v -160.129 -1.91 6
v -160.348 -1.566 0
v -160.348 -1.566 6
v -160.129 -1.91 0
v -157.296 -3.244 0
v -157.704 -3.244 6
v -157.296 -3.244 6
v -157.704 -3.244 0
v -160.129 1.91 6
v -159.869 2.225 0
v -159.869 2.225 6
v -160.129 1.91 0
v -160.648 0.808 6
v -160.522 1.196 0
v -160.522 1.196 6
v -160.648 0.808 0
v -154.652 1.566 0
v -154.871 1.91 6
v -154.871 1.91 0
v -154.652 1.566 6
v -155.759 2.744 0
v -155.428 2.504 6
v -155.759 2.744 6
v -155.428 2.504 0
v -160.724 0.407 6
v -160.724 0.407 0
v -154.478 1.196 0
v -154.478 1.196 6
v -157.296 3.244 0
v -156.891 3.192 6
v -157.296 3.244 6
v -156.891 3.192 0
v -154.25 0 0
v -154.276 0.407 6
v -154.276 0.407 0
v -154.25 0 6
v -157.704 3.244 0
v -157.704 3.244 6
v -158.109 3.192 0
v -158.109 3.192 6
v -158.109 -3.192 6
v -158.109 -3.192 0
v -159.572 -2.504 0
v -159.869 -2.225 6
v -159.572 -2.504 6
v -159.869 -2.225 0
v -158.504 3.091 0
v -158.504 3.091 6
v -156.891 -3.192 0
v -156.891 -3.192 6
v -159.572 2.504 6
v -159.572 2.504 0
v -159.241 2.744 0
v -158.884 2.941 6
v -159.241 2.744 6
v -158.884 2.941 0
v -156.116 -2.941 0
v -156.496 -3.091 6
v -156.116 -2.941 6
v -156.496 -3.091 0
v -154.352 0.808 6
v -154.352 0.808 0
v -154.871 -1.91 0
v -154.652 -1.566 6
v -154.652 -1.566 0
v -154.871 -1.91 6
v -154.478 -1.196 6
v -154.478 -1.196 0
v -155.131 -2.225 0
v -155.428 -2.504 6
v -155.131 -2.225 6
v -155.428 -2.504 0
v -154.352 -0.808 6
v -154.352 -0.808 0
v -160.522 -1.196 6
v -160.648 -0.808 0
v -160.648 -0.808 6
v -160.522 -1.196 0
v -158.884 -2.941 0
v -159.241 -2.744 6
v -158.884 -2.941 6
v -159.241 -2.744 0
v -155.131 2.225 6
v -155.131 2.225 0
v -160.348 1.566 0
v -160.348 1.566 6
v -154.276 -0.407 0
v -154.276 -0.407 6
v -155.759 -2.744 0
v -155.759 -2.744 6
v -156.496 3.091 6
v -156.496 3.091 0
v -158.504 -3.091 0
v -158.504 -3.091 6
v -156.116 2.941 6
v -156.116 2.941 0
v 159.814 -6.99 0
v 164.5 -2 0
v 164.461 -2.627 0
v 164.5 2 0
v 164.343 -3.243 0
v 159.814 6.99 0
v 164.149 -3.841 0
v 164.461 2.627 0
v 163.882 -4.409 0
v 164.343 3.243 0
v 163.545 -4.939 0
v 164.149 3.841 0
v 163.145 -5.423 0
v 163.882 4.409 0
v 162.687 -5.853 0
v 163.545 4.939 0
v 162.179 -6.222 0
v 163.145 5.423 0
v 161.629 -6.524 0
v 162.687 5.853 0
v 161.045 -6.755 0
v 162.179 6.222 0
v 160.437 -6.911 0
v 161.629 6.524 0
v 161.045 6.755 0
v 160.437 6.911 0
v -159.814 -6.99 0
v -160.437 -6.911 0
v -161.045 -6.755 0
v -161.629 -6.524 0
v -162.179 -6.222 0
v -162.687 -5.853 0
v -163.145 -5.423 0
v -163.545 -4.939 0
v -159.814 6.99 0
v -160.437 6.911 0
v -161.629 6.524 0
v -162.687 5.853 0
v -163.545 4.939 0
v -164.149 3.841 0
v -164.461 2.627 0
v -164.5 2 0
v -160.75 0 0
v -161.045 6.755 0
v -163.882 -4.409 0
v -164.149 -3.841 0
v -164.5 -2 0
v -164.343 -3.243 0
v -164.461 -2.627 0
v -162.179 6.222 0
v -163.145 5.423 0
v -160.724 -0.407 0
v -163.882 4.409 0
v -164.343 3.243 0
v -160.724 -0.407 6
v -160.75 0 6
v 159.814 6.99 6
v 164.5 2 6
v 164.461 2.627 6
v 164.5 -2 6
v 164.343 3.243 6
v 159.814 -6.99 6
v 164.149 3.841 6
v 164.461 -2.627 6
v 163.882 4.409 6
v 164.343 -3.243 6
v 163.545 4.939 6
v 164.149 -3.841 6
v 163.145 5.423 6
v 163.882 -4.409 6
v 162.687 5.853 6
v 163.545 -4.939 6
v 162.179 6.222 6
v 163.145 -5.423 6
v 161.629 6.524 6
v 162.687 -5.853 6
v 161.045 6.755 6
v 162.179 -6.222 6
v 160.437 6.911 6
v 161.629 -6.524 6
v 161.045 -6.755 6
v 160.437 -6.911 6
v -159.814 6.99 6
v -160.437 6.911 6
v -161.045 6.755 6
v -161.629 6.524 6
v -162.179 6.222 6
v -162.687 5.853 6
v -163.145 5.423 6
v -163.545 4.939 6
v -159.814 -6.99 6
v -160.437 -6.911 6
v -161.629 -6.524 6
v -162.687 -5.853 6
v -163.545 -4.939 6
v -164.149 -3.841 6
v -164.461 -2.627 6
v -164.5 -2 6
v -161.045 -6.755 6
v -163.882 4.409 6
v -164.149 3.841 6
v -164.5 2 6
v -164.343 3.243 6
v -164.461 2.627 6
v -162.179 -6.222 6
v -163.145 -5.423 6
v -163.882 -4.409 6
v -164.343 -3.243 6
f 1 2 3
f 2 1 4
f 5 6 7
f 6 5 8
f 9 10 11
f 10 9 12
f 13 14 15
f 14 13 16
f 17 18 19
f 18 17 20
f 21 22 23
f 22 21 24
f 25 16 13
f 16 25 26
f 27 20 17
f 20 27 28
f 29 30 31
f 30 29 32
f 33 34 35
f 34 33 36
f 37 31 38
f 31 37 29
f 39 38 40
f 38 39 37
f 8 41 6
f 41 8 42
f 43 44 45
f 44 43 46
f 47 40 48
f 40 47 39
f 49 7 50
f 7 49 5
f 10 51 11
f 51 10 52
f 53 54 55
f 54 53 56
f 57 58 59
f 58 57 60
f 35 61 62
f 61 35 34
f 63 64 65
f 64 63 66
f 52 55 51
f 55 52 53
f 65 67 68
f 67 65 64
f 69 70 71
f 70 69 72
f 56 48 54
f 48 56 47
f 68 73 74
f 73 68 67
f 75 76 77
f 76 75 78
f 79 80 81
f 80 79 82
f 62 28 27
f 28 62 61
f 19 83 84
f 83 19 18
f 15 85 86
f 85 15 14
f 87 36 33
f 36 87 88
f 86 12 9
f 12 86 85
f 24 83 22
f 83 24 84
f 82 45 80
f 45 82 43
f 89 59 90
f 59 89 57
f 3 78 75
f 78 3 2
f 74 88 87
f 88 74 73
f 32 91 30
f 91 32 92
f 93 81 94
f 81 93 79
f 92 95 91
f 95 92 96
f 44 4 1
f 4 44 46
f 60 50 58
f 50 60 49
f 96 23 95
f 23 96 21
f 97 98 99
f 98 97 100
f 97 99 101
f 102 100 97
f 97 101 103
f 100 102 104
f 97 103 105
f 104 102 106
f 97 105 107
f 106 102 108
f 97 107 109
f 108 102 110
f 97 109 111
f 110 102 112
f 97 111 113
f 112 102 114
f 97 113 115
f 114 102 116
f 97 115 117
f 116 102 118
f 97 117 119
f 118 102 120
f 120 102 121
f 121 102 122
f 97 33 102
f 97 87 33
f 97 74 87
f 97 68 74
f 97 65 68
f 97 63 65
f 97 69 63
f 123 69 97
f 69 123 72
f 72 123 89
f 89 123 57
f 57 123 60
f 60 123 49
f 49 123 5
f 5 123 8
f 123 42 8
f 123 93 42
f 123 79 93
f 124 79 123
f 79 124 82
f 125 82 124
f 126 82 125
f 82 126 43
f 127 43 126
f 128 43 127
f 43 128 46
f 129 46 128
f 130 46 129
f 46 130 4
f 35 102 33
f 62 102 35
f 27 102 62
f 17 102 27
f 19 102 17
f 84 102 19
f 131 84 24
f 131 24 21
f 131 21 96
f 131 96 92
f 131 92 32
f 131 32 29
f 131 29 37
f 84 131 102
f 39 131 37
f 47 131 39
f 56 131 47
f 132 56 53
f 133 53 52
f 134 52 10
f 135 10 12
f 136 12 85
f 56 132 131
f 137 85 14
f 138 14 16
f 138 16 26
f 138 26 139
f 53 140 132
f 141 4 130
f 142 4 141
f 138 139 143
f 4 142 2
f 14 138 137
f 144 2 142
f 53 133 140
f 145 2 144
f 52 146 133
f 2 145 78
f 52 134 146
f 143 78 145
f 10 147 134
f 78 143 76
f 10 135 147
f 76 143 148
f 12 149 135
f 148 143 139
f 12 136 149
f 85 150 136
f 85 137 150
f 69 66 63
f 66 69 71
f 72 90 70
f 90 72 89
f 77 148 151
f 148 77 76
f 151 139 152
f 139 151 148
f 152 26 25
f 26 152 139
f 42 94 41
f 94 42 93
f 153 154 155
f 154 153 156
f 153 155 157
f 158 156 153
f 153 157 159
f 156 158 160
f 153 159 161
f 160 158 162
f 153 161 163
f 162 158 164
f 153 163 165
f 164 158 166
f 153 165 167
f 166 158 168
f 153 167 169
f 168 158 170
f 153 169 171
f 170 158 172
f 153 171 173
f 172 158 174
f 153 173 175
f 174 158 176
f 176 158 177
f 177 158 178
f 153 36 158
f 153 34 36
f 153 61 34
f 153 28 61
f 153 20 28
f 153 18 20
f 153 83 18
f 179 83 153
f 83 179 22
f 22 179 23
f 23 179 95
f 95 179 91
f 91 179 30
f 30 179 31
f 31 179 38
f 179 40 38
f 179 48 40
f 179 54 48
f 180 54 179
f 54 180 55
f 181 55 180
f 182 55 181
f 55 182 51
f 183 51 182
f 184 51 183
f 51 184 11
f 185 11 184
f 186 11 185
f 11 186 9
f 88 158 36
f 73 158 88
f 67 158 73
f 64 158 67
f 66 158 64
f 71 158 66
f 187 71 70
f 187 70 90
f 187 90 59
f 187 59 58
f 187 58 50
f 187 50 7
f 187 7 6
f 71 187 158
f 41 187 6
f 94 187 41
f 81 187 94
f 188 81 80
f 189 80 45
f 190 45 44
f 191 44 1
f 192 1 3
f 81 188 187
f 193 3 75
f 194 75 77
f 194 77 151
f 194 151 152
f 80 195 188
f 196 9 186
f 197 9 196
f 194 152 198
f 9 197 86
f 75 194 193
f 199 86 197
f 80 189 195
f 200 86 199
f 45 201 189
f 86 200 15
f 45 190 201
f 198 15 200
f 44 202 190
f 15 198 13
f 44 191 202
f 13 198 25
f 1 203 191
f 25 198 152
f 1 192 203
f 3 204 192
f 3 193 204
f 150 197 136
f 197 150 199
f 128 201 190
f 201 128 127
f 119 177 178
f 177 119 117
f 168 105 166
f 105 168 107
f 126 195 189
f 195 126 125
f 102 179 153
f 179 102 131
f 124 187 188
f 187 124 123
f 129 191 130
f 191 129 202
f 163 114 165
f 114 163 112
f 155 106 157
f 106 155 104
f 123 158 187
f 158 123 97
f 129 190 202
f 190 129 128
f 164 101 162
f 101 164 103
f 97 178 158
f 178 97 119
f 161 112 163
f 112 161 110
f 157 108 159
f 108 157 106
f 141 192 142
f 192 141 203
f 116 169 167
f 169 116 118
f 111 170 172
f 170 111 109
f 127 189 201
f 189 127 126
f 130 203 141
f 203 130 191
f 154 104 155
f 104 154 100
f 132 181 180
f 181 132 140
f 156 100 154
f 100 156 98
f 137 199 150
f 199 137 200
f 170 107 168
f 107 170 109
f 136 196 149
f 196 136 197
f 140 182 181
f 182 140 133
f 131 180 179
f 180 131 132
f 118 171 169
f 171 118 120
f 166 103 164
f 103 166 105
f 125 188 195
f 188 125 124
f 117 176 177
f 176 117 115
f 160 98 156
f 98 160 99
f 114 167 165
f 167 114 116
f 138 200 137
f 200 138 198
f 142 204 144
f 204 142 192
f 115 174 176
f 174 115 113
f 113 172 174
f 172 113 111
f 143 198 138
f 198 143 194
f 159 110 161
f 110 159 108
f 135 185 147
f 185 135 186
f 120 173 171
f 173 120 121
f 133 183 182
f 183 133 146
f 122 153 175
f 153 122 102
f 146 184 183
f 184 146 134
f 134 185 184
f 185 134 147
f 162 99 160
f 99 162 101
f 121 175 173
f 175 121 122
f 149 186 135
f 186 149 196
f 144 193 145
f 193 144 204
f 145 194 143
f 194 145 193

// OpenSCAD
$fn = 50;


difference() {
	union() {
		hull() {
			translate(v = [-159.5000000000, 2.0000000000, 0]) {
				cylinder(h = 6, r = 5);
			}
			translate(v = [159.5000000000, 2.0000000000, 0]) {
				cylinder(h = 6, r = 5);
			}
			translate(v = [-159.5000000000, -2.0000000000, 0]) {
				cylinder(h = 6, r = 5);
			}
			translate(v = [159.5000000000, -2.0000000000, 0]) {
				cylinder(h = 6, r = 5);
			}
		}
	}
	union() {
		translate(v = [-157.5000000000, 0.0000000000, 0]) {
			cylinder(h = 6, r = 3.2500000000);
		}
		translate(v = [-157.5000000000, 0.0000000000, 0]) {
			cylinder(h = 6, r = 1.8000000000);
		}
		translate(v = [-157.5000000000, 0.0000000000, 0]) {
			cylinder(h = 6, r = 1.8000000000);
		}
		translate(v = [-157.5000000000, 0.0000000000, 0]) {
			cylinder(h = 6, r = 1.8000000000);
		}
	}
}
